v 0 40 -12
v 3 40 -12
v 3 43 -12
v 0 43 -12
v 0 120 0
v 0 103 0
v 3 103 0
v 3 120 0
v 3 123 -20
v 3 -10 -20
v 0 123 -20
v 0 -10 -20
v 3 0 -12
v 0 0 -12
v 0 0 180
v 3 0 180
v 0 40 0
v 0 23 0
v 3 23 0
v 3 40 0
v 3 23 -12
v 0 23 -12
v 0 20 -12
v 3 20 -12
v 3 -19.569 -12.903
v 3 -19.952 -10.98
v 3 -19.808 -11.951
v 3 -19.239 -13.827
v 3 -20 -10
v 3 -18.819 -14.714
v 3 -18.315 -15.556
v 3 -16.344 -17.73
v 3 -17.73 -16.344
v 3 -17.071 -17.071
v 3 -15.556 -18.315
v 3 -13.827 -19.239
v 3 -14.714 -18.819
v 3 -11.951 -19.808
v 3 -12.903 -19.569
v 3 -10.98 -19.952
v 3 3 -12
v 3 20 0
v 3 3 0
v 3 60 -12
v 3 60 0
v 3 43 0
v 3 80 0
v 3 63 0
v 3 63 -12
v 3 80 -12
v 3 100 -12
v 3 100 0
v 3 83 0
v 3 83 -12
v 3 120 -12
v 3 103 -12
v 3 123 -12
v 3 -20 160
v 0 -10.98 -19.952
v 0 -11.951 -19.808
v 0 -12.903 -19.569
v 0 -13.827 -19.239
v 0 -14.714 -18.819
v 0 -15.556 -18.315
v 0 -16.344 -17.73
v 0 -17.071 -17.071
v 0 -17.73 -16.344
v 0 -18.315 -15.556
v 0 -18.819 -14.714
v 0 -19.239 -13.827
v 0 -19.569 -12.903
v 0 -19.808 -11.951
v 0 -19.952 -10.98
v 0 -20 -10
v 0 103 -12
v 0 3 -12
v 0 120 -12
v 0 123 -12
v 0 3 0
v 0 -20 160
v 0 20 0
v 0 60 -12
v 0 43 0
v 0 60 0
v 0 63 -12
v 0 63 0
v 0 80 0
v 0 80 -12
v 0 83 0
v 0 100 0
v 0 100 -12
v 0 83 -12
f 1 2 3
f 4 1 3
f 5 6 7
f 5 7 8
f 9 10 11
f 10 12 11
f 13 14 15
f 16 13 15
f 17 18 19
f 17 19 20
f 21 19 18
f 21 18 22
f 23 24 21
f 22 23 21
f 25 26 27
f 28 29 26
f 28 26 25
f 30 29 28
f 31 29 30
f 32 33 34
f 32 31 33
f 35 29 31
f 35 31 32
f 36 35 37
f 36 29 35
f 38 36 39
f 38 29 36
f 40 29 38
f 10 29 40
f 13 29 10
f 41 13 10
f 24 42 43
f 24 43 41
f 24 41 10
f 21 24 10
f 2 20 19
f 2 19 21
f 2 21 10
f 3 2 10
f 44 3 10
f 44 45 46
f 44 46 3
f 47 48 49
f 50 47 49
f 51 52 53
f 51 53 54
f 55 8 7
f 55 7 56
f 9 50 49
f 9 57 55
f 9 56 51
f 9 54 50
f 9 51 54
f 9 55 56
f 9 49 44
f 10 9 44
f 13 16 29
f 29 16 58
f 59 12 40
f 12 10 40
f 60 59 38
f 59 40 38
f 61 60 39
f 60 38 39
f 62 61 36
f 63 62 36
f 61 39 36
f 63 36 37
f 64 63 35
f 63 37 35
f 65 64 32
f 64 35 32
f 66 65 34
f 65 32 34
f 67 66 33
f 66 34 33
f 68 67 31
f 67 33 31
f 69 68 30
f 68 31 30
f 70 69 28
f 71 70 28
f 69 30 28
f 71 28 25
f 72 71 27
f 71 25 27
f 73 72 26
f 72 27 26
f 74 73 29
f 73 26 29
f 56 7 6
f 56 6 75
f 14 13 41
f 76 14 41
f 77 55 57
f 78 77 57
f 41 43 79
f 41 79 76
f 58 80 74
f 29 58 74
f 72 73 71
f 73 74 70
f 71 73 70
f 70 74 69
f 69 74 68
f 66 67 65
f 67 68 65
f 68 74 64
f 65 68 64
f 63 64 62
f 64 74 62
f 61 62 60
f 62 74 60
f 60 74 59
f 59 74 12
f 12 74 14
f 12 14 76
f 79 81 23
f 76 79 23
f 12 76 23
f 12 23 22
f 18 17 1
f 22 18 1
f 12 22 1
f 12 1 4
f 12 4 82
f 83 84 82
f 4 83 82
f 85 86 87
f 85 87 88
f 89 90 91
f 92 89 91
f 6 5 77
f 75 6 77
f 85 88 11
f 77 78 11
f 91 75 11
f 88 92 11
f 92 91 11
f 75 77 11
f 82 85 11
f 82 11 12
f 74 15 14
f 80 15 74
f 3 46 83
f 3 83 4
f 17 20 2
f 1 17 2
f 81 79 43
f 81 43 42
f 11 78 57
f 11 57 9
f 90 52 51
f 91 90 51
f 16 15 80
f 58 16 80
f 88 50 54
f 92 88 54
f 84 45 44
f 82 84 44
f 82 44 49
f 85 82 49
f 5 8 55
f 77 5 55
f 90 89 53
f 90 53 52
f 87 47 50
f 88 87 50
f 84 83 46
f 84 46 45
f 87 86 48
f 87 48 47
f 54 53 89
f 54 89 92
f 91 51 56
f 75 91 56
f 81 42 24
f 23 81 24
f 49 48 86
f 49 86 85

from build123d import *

# Parameters (mm, degrees)
SKETCH1_W           = 20
SKETCH1_H           = 123
BOSS_EXTRUDE1_DEPTH = 3
SKETCH2_W           = 12
SKETCH2_H           = 3
CUT_EXTRUDE1_DEPTH  = 125.651514231
LPATTERN1_COUNT     = 7
LPATTERN1_PITCH     = 20
BOSS_EXTRUDE2_DEPTH = 3
FILLET1_R           = 10


with BuildPart() as part:
    # Sketch1 → Boss-Extrude1 (new body)
    with BuildSketch(Plane(origin=(0, 0, 0), x_dir=(0, 0, -1), z_dir=(1, 0, 0))):
        with Locations((10, 61.5)):
            Rectangle(SKETCH1_W, SKETCH1_H)
    extrude(amount=BOSS_EXTRUDE1_DEPTH)

    # Sketch2 → Cut-Extrude1 (cut, through all)
    with BuildSketch(Plane(origin=(3, 0, 0), x_dir=(0, 0, -1), z_dir=(1, 0, 0))):
        with Locations((6, 1.5)):
            Rectangle(SKETCH2_W, SKETCH2_H)
    cut_extrude1 = extrude(amount=-CUT_EXTRUDE1_DEPTH, mode=Mode.SUBTRACT)

    # LPattern1: Cut-Extrude1 ×7
    with Locations(*[(0, i * LPATTERN1_PITCH, 0) for i in range(1, LPATTERN1_COUNT)]):
        add(cut_extrude1, mode=Mode.SUBTRACT)

    # Sketch3 → Boss-Extrude2 (add)
    with BuildSketch(Plane.ZY):
        Polygon((180, 0), (160, -20), (-20, -20), (-20, 0), align=None)
    extrude(amount=-BOSS_EXTRUDE2_DEPTH)

    # Fillet1
    fillet1_edges = [part.edges().sort_by_distance(p)[0] for p in [
        (1.5, -20, -20),
    ]]
    fillet(fillet1_edges, radius=FILLET1_R)


solid = part.part
